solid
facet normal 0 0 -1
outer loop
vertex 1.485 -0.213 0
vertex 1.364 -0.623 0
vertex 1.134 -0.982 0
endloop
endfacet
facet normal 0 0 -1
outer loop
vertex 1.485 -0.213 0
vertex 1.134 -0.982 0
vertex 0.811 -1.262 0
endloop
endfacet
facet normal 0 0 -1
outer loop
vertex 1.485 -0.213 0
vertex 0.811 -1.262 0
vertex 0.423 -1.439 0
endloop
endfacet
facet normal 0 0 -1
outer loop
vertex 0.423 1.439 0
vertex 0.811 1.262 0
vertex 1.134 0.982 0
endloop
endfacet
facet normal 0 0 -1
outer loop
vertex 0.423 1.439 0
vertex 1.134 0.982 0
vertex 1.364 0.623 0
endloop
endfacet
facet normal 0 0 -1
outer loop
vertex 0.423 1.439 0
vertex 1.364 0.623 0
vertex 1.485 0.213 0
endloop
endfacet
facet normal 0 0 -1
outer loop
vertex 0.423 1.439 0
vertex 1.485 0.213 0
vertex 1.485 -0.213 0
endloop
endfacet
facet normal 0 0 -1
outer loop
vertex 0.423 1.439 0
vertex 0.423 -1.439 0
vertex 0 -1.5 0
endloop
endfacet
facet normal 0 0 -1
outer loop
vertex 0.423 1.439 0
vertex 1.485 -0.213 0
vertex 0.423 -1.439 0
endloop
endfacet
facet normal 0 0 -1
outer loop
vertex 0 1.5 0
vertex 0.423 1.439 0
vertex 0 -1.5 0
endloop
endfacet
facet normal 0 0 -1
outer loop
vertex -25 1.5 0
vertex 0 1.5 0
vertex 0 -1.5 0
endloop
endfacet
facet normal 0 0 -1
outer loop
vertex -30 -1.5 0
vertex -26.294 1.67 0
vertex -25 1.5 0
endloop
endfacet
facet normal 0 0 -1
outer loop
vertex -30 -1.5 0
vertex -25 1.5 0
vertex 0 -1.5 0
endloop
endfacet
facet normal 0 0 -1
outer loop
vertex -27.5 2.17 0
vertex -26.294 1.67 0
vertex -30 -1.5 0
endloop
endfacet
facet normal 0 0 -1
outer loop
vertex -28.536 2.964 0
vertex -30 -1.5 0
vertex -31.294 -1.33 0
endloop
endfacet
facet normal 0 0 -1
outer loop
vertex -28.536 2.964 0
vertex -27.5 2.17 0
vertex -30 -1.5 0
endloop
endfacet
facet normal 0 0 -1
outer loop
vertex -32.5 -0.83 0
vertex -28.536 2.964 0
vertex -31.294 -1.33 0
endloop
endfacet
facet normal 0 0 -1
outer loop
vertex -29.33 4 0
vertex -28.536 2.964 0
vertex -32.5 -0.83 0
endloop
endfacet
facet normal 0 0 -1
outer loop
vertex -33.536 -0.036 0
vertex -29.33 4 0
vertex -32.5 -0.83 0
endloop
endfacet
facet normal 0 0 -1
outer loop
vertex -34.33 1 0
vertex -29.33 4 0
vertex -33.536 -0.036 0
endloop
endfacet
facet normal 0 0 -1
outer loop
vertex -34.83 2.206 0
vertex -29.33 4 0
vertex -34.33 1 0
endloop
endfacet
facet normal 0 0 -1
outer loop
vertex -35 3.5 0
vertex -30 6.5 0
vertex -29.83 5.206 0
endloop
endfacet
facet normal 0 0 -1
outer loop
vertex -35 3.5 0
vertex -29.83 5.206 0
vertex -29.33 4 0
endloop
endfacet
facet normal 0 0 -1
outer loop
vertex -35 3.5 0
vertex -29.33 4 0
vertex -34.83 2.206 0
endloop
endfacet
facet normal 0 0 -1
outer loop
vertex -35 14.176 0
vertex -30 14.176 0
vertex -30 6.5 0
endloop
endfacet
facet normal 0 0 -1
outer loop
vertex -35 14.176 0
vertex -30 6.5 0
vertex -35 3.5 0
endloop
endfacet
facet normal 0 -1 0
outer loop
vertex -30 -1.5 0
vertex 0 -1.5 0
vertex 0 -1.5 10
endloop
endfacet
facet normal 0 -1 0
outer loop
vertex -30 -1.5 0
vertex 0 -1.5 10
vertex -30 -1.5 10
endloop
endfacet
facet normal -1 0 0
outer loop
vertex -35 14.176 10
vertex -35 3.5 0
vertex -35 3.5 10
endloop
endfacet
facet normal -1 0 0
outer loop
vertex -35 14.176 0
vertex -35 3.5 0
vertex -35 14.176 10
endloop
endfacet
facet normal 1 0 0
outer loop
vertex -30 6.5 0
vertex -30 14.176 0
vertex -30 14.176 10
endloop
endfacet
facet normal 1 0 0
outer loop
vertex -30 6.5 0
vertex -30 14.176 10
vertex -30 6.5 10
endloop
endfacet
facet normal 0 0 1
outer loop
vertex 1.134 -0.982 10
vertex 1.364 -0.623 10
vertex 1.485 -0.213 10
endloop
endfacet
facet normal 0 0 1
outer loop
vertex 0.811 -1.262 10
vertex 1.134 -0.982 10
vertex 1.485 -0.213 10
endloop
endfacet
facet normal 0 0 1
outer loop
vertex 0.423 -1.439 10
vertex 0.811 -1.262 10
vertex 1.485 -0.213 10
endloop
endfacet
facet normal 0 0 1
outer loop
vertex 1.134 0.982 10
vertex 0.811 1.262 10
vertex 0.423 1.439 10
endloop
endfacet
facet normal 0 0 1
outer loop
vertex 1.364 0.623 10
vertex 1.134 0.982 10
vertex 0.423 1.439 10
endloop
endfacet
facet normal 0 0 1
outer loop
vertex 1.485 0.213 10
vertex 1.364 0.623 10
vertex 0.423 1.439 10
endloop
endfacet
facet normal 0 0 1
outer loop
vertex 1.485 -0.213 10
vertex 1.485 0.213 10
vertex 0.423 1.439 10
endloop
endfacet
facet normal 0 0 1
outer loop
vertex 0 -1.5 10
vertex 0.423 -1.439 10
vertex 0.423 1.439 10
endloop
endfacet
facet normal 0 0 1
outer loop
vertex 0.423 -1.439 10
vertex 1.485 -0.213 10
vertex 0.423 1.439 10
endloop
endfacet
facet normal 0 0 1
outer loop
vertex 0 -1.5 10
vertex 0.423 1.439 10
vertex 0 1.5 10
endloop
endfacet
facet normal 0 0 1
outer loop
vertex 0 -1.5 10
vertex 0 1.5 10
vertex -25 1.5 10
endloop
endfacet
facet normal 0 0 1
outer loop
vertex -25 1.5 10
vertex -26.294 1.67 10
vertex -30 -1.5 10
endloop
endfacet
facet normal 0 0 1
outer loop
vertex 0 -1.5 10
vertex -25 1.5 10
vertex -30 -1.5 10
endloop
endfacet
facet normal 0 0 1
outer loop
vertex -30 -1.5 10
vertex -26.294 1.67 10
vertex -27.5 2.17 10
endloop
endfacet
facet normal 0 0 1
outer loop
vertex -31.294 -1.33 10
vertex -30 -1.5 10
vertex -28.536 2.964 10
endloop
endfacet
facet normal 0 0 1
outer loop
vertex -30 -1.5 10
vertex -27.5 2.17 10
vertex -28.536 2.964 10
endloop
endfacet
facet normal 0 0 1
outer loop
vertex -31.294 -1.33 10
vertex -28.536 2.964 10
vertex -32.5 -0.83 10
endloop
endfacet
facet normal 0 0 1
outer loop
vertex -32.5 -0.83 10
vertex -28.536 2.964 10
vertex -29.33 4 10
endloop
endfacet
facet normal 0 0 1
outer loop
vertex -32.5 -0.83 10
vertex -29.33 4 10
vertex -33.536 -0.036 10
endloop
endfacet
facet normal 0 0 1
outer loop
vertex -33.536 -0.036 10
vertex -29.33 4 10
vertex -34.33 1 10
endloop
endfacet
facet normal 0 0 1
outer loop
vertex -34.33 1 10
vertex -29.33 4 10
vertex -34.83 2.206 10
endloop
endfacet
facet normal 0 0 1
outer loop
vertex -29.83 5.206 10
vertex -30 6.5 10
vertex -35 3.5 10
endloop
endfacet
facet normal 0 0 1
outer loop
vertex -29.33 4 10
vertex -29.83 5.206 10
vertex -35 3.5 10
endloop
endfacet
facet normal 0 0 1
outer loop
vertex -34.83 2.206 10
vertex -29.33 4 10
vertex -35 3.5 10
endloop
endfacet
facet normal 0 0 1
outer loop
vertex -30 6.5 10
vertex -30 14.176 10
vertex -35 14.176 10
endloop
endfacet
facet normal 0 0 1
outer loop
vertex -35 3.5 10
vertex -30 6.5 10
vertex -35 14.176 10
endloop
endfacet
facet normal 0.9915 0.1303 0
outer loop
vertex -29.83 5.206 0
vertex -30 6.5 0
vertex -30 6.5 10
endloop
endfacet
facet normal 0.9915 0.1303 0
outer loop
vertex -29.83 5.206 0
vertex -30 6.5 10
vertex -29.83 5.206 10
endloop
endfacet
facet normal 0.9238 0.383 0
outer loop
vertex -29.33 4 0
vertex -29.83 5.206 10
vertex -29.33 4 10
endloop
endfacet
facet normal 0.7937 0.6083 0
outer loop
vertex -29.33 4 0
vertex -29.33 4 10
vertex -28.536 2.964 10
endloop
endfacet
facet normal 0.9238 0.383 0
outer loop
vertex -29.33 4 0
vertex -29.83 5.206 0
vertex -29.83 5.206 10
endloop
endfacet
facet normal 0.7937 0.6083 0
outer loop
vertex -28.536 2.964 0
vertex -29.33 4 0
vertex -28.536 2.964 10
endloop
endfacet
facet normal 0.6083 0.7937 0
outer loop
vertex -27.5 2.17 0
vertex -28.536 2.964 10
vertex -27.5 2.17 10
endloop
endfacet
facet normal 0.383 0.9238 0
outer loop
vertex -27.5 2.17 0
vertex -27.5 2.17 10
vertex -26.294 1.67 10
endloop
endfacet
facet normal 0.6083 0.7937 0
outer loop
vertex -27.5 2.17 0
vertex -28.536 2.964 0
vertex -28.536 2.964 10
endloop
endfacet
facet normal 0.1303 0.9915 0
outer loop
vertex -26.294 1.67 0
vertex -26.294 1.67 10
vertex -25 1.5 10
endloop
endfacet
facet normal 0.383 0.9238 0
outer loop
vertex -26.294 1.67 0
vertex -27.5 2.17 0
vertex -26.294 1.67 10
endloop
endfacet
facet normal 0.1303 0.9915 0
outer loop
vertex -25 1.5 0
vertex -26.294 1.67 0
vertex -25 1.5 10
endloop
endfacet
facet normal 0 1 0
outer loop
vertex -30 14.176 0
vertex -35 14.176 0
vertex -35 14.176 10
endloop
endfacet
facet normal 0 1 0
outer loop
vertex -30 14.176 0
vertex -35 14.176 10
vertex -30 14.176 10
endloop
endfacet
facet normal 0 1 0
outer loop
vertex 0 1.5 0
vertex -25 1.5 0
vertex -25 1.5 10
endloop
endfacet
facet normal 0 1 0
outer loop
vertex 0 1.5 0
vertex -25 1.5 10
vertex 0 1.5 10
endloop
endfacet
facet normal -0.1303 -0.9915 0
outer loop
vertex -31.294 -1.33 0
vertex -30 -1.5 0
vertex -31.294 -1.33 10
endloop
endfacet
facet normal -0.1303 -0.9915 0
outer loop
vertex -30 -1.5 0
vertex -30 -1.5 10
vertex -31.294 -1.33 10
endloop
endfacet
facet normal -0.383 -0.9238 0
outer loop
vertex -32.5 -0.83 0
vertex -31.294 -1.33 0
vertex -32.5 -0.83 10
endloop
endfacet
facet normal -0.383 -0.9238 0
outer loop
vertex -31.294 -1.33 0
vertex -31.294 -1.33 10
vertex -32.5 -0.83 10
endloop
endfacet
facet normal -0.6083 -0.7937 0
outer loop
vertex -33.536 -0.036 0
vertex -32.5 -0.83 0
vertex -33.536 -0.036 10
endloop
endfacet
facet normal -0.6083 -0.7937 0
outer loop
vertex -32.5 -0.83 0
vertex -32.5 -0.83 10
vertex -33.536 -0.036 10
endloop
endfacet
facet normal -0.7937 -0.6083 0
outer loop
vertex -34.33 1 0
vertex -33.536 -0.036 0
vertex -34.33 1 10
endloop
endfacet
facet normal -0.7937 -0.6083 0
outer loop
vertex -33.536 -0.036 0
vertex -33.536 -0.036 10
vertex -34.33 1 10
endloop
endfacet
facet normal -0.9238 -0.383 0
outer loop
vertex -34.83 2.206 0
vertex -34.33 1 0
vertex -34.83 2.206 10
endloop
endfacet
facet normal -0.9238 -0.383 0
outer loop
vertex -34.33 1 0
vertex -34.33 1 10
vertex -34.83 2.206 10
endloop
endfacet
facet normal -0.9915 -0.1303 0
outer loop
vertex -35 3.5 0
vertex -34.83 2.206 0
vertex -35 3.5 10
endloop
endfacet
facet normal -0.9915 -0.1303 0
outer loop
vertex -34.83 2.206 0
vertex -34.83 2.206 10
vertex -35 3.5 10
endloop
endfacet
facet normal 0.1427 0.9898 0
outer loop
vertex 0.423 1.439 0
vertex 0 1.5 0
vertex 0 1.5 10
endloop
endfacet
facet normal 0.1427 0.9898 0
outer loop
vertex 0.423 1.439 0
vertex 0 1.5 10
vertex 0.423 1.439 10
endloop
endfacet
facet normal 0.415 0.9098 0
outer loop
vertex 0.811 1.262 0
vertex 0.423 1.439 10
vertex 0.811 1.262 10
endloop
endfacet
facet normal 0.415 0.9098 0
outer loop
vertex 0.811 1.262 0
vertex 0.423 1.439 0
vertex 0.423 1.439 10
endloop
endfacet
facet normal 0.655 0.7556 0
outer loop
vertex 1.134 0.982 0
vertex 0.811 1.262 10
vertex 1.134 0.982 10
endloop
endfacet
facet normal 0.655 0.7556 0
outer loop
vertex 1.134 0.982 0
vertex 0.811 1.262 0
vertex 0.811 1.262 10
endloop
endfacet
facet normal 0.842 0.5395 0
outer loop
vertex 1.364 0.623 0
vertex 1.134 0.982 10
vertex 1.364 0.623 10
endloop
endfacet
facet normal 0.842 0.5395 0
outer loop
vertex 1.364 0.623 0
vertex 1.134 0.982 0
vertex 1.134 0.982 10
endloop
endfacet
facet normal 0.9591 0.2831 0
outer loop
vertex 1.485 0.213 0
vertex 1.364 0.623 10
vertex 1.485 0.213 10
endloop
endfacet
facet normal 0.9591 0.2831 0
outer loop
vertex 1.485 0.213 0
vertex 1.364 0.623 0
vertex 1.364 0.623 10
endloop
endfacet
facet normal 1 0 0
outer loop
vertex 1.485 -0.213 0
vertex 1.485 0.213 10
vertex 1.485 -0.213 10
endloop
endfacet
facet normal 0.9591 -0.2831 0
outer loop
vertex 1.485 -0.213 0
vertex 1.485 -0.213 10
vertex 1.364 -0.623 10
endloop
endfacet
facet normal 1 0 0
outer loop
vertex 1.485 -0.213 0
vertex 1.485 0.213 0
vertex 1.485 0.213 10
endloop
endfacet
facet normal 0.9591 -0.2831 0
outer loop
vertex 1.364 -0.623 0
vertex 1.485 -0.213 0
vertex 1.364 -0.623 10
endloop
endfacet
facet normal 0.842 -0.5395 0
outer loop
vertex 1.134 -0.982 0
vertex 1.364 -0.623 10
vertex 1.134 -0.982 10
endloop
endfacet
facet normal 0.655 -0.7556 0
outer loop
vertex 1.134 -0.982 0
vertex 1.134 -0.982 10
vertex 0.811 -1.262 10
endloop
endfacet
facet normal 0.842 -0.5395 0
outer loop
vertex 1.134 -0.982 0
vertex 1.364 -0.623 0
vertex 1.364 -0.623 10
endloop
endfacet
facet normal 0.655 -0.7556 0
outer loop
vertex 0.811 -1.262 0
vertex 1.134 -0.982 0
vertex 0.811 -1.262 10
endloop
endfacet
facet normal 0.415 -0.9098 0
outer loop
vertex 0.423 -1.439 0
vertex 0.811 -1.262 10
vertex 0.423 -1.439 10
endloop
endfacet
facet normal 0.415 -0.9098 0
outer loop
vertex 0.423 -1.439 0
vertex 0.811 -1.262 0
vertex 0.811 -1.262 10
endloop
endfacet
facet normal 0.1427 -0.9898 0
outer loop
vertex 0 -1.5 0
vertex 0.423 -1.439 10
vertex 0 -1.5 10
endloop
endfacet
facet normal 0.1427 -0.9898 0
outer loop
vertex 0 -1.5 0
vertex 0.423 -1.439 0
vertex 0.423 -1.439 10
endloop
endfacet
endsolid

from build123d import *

# Parameters (mm, degrees)
EXTRUDE_1_DEPTH = 10
FILLET_1_R      = 5


with BuildPart() as part:
    # 草图1 → 凸台-拉伸1 (new body)
    with BuildSketch(Plane.XY):
        with BuildLine():
            Line((0, -1.5), (-30, -1.5))
            Line((-30, -1.5), (-35, -1.5))
            Line((-35, -1.5), (-35, 14.176056338))
            Line((-35, 14.176056338), (-30, 14.176056338))
            Line((-30, 14.176056338), (-30, 6.5))
            ThreePointArc((-30, 6.5), (-28.535533906, 2.964466094), (-25, 1.5))
            Line((-25, 1.5), (0, 1.5))
            ThreePointArc((0, 1.5), (1.5, 0), (0, -1.5))
        make_face()
    extrude(amount=EXTRUDE_1_DEPTH)

    # 圆角1
    fillet_1_edges = [part.edges().sort_by_distance(p)[0] for p in [
        (-35, -1.5, 5),
    ]]
    fillet(fillet_1_edges, radius=FILLET_1_R)


solid = part.part
